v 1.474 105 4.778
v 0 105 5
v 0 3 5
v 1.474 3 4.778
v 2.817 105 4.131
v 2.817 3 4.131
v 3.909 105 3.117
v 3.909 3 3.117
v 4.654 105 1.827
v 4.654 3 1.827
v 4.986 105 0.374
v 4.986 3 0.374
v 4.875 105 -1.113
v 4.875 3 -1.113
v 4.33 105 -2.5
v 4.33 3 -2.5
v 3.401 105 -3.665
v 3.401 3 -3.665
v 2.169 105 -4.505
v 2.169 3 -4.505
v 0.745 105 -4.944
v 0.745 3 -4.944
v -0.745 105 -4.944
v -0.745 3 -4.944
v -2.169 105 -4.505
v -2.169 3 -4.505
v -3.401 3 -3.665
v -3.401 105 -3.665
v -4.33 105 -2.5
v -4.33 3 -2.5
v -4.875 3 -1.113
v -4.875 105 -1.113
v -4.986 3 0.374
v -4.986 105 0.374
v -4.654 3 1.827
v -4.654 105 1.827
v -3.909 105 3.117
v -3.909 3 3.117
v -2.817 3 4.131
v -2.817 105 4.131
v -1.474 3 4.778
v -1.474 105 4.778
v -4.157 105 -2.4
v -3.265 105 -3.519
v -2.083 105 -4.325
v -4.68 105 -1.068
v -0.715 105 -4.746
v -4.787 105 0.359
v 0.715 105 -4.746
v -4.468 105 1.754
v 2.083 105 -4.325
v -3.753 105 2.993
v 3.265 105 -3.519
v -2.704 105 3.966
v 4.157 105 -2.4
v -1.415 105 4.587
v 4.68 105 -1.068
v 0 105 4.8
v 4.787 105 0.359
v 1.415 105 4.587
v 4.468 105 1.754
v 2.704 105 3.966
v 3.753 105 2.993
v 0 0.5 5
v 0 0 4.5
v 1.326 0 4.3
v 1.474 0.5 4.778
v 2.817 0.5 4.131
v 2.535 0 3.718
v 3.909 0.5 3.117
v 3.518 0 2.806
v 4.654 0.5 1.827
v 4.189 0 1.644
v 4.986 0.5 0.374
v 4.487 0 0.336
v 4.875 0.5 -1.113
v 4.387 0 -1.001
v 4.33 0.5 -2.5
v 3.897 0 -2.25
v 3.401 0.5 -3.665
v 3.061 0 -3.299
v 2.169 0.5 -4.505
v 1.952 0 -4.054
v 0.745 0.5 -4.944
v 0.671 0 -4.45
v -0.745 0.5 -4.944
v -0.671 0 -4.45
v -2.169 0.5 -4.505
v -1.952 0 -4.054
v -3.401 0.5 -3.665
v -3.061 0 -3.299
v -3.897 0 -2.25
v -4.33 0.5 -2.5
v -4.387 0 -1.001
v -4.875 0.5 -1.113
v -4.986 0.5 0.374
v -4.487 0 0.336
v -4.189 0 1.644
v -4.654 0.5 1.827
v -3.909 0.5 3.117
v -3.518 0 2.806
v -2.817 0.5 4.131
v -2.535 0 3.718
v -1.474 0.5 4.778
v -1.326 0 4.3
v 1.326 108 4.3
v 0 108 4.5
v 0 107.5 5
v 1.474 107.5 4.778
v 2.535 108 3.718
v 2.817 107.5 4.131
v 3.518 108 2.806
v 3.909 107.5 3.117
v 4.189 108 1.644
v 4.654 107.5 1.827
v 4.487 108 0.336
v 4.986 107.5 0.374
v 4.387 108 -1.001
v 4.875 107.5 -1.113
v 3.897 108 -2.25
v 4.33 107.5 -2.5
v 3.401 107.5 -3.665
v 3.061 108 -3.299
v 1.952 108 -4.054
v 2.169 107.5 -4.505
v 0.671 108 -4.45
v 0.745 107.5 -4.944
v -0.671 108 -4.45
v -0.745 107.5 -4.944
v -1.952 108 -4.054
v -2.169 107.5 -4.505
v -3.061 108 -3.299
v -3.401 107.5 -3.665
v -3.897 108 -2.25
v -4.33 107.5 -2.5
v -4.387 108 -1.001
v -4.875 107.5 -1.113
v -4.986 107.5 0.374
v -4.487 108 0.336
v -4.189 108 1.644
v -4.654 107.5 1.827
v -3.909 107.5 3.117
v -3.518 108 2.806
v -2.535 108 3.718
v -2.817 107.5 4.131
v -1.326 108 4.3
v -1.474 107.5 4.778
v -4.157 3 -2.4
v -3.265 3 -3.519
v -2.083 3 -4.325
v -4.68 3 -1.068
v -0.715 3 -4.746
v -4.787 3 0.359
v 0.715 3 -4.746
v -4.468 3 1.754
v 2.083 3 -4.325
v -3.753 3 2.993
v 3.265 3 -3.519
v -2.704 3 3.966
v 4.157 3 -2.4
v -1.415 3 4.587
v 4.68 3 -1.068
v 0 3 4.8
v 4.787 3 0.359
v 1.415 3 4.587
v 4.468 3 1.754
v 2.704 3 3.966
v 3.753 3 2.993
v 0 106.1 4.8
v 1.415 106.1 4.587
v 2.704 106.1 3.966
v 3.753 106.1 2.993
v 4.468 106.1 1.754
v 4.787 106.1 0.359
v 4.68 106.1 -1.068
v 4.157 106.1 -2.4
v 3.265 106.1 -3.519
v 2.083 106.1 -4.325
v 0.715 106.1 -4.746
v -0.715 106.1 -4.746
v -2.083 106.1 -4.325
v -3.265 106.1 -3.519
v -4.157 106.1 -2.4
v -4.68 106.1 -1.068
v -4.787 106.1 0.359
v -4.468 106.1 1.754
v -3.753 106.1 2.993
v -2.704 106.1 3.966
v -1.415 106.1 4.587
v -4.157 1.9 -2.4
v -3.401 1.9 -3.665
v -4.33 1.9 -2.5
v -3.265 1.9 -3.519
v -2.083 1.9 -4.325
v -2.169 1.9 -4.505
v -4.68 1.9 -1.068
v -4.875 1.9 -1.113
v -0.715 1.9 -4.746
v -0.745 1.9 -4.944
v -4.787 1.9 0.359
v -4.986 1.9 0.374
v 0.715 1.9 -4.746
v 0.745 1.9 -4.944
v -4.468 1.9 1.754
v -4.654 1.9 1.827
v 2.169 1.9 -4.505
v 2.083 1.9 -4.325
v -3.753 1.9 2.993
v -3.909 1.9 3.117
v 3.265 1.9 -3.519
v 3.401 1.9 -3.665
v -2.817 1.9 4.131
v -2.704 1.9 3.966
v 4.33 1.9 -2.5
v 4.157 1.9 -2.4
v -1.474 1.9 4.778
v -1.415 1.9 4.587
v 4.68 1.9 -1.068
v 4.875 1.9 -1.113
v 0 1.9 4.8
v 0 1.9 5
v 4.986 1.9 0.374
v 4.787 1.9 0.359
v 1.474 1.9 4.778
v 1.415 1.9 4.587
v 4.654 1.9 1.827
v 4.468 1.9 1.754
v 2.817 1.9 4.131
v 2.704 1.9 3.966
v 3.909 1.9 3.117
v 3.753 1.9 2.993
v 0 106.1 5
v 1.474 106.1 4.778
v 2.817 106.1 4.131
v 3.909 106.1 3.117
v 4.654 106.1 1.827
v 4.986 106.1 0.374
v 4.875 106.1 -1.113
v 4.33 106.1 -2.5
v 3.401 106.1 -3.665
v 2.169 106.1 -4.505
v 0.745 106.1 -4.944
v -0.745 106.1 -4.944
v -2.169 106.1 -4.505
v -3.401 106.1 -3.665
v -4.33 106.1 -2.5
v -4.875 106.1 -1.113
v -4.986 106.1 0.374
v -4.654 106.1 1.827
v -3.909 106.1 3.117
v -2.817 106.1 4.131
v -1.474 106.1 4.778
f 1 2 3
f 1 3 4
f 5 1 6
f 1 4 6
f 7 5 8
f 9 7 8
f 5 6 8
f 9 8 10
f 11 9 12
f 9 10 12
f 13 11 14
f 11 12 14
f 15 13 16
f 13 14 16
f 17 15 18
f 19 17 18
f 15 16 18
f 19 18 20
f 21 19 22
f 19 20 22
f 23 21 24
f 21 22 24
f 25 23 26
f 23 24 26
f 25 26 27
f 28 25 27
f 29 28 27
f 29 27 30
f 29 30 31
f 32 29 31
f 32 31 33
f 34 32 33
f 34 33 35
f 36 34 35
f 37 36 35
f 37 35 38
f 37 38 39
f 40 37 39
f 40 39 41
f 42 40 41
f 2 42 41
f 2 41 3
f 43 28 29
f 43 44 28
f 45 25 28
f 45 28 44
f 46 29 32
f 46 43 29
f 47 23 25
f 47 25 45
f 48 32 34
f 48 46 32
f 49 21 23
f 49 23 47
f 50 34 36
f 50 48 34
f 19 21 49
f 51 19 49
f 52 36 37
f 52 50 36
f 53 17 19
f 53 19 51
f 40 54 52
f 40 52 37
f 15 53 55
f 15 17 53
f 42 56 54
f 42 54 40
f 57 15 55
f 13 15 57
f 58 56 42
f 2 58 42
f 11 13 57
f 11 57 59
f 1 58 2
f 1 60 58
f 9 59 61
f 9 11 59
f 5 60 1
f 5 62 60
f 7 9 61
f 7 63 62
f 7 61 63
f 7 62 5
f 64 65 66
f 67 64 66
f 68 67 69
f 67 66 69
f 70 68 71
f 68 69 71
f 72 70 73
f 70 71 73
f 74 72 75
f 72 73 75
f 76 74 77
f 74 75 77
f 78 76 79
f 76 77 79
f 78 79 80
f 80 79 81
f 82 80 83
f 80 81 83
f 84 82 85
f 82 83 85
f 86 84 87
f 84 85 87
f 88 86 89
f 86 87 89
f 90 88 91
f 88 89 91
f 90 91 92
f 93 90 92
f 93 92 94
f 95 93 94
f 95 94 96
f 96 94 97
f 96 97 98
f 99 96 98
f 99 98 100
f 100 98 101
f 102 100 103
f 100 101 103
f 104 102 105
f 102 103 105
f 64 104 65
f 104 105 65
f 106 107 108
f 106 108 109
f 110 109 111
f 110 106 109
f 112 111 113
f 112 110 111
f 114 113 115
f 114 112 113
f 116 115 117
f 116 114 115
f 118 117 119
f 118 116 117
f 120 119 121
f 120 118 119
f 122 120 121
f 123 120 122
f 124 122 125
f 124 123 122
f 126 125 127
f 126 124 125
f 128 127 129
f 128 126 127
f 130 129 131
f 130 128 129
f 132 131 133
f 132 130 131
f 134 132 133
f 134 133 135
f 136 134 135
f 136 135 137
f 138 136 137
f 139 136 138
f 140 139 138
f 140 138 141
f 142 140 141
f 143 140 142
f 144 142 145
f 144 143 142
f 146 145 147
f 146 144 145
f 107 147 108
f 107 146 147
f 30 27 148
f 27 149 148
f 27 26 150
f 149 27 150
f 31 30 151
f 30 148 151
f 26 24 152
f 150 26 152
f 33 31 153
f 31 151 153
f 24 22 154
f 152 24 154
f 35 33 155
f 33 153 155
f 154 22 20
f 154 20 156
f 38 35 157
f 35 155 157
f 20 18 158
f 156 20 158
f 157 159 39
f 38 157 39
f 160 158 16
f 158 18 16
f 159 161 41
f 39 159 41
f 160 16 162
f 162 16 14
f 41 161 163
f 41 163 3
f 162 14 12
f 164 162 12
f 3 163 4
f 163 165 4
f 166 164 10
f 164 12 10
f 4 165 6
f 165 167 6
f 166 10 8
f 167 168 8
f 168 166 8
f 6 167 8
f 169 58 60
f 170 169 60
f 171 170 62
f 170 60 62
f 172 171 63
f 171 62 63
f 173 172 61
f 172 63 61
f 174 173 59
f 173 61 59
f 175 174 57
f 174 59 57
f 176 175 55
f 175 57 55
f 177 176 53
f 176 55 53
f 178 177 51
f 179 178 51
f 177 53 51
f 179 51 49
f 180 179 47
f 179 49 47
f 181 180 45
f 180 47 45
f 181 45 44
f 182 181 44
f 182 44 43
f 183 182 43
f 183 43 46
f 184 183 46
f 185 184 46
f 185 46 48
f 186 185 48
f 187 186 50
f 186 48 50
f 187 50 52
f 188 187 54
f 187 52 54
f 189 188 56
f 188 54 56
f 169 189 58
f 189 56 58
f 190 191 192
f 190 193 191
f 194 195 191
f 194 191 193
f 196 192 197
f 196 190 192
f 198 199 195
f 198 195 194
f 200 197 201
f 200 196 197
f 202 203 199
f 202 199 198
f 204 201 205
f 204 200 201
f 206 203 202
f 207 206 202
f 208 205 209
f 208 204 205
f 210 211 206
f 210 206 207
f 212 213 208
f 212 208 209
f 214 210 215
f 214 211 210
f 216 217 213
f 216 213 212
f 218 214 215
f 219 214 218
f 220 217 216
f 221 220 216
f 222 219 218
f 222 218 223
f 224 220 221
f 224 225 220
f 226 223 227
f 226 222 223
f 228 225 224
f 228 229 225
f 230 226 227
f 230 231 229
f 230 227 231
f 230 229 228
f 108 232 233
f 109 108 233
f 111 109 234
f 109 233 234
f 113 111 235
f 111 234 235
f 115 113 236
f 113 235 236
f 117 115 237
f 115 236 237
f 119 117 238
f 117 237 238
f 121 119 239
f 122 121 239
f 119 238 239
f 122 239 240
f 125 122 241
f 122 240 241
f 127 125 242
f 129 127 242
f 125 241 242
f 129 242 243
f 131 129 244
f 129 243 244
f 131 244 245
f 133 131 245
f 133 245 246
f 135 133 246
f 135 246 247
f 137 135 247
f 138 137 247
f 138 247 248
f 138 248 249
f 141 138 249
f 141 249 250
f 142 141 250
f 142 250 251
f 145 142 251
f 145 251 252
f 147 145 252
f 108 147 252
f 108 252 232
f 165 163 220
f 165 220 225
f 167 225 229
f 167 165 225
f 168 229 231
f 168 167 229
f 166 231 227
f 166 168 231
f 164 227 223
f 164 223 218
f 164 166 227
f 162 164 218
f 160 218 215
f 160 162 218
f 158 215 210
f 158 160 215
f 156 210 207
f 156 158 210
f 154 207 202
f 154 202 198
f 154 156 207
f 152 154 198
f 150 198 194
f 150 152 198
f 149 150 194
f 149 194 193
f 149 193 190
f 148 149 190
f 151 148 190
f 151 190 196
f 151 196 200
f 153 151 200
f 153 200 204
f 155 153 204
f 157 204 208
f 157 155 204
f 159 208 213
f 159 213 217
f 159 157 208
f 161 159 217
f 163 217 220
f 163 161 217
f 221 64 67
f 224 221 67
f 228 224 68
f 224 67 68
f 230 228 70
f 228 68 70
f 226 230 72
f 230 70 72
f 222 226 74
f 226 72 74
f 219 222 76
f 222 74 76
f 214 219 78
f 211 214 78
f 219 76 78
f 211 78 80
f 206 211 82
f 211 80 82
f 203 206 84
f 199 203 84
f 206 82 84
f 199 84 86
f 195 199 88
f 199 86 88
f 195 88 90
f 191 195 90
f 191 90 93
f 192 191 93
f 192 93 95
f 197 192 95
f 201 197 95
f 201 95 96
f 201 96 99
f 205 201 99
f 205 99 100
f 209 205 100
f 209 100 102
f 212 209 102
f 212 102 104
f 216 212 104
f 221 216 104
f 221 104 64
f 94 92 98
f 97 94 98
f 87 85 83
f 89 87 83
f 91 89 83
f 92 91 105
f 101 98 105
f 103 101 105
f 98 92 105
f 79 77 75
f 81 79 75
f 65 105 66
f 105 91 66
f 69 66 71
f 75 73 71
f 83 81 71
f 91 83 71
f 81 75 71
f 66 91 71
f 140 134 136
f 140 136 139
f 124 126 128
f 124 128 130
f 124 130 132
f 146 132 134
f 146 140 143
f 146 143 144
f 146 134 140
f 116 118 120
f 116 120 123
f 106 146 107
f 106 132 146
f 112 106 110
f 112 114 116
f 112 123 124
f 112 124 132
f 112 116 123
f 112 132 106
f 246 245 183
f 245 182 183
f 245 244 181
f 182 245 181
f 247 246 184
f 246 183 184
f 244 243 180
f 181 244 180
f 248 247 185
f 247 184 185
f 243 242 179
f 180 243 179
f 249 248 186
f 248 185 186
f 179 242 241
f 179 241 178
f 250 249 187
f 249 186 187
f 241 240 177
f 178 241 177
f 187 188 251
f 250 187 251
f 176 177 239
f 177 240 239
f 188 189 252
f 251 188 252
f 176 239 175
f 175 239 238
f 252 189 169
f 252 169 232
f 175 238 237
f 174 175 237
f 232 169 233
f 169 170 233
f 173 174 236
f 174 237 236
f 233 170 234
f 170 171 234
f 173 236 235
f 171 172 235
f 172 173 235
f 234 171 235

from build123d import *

# Parameters (mm, degrees)
SKETCH_1_R          = 5
EXTRUDE_1_DEPTH     = 108
CHAMFER_1_SIZE      = 0.5
CUT_EXTRUDE_START   = -3
SKETCH_2_R          = 5
SKETCH_2_R_2        = 4.8
CUT_EXTRUDE_1_DEPTH = 1.1


with BuildPart() as part:
    # 草图1 → 凸台-拉伸1 (new body)
    with BuildSketch(Plane(origin=(0, 0, 0), x_dir=(1, 0, 0), z_dir=(0, 1, 0))):
        with Locations(Location((0, 0, 0), (0, 0, 270))):
            Circle(SKETCH_1_R)
    extrude(amount=EXTRUDE_1_DEPTH)

    # 倒角1
    chamfer_1_edges = [part.edges().sort_by_distance(p)[0] for p in [
        (0, 0, -5),
        (0, 108, -5),
    ]]
    chamfer(chamfer_1_edges, length=CHAMFER_1_SIZE)

    # 草图2 → 切除-拉伸1 (cut)
    with BuildSketch(Plane(origin=(0, 108, 0), x_dir=(1, 0, 0), z_dir=(0, 1, 0)).offset(CUT_EXTRUDE_START)):
        with Locations(Location((0, 0, 0), (0, 0, 270))):
            Circle(SKETCH_2_R)
        with Locations(Location((0, 0, 0), (0, 0, 270))):
            Circle(SKETCH_2_R_2, mode=Mode.SUBTRACT)
    cut_extrude_1 = extrude(amount=CUT_EXTRUDE_1_DEPTH, mode=Mode.SUBTRACT)

    # 镜向1: 切除-拉伸1 across plane
    add(cut_extrude_1.mirror(Plane.ZX.offset(54)), mode=Mode.SUBTRACT)


solid = part.part
